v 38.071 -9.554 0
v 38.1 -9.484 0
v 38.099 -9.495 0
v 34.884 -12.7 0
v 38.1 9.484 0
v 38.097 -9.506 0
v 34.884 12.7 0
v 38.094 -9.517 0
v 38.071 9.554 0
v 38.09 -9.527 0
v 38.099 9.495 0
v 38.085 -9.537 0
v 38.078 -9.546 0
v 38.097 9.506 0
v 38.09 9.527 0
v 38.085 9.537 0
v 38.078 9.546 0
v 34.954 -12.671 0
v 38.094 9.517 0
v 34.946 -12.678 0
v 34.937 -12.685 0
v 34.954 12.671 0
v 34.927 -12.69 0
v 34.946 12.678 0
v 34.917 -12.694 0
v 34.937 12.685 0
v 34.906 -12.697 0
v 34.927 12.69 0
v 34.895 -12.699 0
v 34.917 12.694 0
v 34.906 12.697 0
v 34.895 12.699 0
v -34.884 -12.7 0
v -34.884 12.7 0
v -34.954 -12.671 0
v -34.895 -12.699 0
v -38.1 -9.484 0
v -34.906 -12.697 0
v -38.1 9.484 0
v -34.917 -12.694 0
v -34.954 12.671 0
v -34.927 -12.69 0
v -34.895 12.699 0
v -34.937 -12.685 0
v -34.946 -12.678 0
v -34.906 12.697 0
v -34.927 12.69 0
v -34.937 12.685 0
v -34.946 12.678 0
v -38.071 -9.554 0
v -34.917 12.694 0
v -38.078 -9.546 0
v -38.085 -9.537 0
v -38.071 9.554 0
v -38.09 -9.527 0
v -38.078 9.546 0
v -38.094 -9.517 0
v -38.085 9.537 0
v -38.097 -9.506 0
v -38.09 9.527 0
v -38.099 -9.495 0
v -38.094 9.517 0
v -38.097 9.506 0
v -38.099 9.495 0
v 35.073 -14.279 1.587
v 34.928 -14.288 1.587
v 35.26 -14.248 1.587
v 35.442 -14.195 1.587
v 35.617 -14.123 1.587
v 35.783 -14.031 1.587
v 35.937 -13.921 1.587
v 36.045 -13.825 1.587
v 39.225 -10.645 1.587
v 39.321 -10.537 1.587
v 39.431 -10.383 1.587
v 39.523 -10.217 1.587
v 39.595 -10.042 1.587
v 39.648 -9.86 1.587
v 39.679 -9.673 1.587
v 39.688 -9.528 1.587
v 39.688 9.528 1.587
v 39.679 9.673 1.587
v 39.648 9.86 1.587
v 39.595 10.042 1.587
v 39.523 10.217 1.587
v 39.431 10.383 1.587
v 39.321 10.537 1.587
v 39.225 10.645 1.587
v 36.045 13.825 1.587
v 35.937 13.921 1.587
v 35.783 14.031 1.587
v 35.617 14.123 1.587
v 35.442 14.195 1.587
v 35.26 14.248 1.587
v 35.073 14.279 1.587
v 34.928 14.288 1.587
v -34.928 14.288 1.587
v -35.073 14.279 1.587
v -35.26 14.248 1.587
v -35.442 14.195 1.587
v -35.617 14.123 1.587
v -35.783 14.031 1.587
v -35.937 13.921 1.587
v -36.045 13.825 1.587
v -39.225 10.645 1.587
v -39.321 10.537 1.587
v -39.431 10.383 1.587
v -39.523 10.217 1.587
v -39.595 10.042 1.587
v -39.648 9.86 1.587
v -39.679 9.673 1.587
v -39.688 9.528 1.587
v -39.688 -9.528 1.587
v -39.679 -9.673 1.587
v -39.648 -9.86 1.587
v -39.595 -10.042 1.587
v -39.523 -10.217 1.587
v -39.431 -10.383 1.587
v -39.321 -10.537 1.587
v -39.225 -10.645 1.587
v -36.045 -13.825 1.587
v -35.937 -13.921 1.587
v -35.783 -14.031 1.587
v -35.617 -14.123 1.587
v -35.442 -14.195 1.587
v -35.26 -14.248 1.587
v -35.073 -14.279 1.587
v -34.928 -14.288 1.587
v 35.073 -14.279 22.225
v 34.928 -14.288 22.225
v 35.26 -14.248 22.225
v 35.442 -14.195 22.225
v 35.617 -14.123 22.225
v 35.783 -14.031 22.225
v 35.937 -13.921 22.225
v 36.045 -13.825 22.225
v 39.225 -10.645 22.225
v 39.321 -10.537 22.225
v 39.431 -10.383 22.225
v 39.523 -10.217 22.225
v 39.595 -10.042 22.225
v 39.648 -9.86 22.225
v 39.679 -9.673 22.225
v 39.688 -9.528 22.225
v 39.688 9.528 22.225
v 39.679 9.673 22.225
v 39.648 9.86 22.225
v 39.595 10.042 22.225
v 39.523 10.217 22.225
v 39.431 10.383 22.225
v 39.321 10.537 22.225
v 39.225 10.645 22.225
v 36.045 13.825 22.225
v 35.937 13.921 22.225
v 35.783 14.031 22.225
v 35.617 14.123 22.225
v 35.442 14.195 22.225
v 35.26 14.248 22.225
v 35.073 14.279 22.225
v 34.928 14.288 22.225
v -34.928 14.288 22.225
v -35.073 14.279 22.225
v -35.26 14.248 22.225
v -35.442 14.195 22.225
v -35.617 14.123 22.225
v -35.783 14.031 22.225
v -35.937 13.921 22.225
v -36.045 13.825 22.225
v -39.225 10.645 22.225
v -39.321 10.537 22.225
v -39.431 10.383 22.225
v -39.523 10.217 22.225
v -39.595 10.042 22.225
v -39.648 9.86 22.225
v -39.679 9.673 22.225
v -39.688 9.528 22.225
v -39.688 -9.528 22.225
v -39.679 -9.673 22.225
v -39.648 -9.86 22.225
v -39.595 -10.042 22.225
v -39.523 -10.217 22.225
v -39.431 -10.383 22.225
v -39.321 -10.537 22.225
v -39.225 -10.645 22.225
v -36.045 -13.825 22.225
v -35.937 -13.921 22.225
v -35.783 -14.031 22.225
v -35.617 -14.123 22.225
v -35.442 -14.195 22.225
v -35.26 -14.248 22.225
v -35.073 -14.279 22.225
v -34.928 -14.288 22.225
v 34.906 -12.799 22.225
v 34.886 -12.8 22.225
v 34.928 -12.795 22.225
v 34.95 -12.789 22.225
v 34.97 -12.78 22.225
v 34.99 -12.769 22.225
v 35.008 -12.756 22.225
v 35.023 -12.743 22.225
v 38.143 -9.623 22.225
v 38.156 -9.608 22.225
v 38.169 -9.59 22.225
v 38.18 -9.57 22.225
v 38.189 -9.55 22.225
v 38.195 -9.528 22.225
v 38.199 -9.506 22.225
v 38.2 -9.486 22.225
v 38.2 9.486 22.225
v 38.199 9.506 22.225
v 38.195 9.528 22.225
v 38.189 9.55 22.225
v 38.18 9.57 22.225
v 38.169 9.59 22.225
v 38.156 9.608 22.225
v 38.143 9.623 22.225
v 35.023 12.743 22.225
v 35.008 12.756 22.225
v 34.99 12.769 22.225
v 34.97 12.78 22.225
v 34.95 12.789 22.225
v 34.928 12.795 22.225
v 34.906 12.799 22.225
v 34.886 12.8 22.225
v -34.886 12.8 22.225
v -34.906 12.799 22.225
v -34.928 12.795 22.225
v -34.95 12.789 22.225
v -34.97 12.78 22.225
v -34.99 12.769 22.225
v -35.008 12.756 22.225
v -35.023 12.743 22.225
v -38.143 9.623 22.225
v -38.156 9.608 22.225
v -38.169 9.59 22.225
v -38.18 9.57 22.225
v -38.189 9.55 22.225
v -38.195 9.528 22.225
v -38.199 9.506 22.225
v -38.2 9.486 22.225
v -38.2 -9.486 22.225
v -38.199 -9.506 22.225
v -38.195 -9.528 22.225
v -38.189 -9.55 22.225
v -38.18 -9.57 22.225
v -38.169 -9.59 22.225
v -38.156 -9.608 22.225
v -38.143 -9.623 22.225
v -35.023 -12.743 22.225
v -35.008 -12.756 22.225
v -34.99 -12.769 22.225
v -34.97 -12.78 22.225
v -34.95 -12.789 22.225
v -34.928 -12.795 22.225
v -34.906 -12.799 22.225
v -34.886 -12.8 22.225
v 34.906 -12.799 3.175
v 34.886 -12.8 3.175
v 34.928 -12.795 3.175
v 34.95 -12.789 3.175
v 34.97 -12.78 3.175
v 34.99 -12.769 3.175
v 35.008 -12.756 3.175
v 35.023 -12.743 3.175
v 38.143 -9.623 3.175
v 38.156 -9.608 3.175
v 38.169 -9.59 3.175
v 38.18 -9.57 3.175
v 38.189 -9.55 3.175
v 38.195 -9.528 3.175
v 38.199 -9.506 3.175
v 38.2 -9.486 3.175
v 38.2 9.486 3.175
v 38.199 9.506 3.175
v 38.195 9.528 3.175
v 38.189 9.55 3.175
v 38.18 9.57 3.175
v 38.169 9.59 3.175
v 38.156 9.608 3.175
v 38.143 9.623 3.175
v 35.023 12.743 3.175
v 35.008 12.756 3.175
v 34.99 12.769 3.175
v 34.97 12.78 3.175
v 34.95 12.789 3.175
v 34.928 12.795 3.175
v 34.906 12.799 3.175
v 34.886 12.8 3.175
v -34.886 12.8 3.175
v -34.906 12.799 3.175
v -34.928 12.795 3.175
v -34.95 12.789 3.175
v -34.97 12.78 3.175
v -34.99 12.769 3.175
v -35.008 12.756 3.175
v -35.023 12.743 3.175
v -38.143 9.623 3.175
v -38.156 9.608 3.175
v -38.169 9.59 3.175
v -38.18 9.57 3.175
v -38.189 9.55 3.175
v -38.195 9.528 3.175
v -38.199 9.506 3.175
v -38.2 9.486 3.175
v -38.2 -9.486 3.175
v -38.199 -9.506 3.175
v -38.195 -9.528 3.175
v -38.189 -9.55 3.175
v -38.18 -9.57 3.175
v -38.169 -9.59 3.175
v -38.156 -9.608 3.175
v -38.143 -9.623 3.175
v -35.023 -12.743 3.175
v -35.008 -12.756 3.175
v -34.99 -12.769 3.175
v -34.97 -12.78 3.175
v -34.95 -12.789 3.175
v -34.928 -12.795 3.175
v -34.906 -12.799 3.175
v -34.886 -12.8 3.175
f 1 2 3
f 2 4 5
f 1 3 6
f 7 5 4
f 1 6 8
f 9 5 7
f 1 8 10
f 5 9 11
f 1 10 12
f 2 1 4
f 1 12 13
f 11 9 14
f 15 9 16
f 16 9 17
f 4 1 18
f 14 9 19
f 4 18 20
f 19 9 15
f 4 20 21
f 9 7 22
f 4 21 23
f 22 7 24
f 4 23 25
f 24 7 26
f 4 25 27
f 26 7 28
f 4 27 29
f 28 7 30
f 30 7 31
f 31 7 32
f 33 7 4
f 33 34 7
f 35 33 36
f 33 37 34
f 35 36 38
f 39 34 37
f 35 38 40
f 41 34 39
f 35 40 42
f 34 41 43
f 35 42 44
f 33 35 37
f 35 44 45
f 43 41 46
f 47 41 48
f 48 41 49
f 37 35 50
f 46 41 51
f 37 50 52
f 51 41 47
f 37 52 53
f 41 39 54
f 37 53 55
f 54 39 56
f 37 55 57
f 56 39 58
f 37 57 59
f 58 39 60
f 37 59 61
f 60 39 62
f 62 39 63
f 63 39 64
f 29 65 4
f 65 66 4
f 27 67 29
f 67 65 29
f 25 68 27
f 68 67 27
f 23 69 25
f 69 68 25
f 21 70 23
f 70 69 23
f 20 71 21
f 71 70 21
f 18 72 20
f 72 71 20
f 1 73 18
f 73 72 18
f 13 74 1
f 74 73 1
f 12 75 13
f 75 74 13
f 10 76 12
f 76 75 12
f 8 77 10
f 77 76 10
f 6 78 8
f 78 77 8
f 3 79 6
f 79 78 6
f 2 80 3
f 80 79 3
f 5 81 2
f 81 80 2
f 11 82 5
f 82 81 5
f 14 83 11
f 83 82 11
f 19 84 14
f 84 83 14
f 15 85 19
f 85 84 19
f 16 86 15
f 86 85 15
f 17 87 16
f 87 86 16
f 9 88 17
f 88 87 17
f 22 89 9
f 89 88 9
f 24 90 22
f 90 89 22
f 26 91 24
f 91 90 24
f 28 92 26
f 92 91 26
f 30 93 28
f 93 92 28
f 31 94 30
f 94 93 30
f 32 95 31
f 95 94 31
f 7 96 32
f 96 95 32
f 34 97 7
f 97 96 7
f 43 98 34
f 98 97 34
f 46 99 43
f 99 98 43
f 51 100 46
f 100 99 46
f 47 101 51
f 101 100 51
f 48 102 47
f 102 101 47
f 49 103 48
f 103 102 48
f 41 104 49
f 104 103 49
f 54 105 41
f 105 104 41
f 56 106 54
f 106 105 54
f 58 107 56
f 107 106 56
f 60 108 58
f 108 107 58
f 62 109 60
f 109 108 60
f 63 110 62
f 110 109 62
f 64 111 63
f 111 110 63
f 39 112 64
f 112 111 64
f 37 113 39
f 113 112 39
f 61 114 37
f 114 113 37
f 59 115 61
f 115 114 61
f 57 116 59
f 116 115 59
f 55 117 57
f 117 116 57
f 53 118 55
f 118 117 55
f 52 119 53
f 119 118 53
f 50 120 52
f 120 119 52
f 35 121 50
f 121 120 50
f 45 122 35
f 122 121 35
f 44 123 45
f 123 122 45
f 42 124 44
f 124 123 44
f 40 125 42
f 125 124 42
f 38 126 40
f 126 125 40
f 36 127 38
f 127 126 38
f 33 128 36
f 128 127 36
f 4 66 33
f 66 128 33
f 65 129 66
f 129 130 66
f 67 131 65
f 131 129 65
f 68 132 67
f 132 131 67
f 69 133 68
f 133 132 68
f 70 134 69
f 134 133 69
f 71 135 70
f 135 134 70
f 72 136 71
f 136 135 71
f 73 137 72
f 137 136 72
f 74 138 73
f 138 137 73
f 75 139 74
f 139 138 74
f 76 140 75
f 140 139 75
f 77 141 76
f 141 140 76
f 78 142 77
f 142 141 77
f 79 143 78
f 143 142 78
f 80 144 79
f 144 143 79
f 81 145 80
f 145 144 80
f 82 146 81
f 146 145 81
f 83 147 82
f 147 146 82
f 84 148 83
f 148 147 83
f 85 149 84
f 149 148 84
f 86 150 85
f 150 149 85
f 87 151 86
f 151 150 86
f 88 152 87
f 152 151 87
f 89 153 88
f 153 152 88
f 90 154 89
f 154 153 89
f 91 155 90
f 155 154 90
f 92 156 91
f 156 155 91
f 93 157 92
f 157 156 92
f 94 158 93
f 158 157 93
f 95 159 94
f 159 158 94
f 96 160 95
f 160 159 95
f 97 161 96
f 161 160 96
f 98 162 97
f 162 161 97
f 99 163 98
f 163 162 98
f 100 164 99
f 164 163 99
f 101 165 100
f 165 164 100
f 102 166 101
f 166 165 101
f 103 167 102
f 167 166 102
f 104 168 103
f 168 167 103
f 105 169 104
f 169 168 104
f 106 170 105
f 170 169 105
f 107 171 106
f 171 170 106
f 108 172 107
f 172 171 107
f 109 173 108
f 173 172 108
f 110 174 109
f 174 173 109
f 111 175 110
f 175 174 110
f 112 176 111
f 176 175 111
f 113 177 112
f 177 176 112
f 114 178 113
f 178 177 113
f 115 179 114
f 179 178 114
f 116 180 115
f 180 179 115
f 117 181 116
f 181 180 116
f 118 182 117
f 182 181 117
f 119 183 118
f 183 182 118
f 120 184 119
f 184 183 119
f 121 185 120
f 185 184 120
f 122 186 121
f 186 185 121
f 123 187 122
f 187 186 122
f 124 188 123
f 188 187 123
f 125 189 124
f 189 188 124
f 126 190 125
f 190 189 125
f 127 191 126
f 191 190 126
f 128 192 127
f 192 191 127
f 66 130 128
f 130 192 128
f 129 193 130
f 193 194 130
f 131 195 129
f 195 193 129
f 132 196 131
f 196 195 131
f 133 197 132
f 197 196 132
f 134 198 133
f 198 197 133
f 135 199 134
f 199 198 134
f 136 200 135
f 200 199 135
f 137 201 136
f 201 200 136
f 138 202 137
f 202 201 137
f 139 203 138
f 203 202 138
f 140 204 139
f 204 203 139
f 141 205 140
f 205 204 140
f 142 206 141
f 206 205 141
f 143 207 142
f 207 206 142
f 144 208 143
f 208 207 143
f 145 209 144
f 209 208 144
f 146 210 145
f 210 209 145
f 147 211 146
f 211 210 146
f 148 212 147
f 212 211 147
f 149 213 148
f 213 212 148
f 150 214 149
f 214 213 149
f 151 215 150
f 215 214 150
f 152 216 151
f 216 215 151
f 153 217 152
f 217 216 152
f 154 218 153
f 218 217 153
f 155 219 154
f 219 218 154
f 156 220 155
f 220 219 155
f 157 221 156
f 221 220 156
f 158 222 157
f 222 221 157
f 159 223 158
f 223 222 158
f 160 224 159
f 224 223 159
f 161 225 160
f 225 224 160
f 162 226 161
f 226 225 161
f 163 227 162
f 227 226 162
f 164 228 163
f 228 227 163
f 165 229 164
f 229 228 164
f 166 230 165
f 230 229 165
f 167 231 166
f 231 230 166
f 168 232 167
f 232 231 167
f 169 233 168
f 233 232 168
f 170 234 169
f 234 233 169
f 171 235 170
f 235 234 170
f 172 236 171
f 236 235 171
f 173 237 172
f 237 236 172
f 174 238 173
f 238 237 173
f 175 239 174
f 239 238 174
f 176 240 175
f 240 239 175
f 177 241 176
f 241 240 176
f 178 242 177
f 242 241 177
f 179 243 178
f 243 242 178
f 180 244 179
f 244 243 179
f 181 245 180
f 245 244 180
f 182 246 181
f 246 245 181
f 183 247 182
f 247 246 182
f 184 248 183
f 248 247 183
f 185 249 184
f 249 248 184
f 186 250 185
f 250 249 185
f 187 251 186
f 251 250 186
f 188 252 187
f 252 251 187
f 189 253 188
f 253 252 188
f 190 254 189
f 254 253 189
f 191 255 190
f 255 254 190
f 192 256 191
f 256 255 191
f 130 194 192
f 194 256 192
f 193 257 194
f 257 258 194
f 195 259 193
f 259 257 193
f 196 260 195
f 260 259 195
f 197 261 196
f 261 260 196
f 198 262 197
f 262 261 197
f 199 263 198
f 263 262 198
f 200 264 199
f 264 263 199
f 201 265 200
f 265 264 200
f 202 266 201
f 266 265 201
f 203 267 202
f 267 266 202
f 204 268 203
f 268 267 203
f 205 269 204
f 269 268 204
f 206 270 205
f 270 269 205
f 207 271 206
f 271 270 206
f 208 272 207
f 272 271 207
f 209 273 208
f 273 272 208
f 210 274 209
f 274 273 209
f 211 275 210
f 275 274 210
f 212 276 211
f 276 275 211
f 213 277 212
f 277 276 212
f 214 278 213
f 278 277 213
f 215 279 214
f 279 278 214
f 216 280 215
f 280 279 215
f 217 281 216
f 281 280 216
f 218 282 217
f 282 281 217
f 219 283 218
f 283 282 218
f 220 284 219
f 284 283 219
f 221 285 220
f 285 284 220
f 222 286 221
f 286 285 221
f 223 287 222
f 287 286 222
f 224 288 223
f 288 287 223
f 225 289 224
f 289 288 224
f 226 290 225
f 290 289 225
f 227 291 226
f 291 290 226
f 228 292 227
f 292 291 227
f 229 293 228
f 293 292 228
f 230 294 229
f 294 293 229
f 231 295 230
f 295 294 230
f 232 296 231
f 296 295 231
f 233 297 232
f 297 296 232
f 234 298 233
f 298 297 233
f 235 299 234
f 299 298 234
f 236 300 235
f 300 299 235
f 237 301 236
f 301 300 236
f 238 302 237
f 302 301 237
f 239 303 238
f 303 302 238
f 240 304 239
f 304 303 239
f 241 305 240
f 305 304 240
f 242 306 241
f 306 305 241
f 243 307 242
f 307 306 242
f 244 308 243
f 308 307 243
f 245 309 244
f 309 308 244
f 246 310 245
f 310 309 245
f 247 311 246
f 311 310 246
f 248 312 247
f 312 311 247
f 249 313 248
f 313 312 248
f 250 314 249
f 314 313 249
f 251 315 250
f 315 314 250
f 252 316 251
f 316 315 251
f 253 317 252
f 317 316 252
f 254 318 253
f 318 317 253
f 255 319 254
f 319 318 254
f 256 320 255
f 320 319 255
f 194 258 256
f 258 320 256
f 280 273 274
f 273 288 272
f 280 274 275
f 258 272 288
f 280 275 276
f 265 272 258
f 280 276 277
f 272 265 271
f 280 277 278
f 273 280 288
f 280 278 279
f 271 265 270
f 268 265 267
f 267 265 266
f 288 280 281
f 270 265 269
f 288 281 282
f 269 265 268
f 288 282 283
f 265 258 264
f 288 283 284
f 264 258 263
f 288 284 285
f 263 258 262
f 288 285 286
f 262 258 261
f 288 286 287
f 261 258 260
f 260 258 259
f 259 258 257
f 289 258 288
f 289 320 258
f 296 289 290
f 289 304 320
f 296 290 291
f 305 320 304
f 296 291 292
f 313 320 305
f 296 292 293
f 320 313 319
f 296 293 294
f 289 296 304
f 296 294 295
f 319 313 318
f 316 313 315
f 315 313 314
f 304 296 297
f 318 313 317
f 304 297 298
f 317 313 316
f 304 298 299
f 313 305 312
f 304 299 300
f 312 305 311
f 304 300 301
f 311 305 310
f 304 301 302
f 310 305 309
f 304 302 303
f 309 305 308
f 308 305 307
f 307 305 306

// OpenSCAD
// TOGridPileCap1.0
// 
// Cap for standard 1/8"-beveled TOGridPile cups.

inner_size_atoms = [6,2,1.5];
wall_thickness_u = 1;
floor_thickness_u = 2;
// Interior offset of walls into cavity.  Zero or positive for a tight fit, recommended for rubbery materials.  -0.1 recommended for loosish fit with rigid materials like PLA.
inner_offset = -0.1;
outer_offset =  0.0;
$fn = 64;

module __togridpile1cap__end_params() { }

use <../lib/SimpleCap0.scad>
use <../lib/TOGMod1.scad>
use <../lib/TOGridLib3.scad>
use <../lib/TGx11.1Lib.scad>

function togridpilecap1_make_cap(
	inner_size_ca,
	wall_thickness_u,
	floor_thickness_u
) = 
let(inner_size            = togridlib3_decode_vector(inner_size_ca))
let(inner_bevel_size      = togridlib3_decode([1, "tgp-standard-bevel"]))
let(inner_rounding_radius = max(0.1, togridlib3_decode([1, "tgp-min-f-corner-radius"])))
echo(inner_size=inner_size, inner_bevel_size, inner_rounding_radius)
let(wall_thickness        = togridlib3_decode([wall_thickness_u, "u"]) + inner_offset + outer_offset)
let(floor_thickness       = togridlib3_decode([floor_thickness_u, "u"]))
let(inner_rath =
	let(hw = inner_size[0]/2, hh = inner_size[1]/2)
	let(ops = [["bevel", inner_bevel_size], ["round", inner_rounding_radius], ["offset", -inner_offset] ])
	["togpath1-rath",
		["togpath1-rathnode", [ hw, -hh], each ops],
		["togpath1-rathnode", [ hw,  hh], each ops],
		["togpath1-rathnode", [-hw,  hh], each ops],
		["togpath1-rathnode", [-hw, -hh], each ops],
	]
)
simplecap0_make_cap(
	inner_rath,
	inner_size[2]+floor_thickness,
	floor_thickness,
	wall_thickness,
	bevel_size = min(floor_thickness*0.6, wall_thickness - inner_offset + inner_rounding_radius - 0.1)
);

$togridlib3_unit_table = tgx11_get_default_unit_table();

togmod1_domodule(togridpilecap1_make_cap(
	[for(d=inner_size_atoms) [d, "atom"]],
	floor_thickness_u = floor_thickness_u,
	wall_thickness_u = wall_thickness_u
));
